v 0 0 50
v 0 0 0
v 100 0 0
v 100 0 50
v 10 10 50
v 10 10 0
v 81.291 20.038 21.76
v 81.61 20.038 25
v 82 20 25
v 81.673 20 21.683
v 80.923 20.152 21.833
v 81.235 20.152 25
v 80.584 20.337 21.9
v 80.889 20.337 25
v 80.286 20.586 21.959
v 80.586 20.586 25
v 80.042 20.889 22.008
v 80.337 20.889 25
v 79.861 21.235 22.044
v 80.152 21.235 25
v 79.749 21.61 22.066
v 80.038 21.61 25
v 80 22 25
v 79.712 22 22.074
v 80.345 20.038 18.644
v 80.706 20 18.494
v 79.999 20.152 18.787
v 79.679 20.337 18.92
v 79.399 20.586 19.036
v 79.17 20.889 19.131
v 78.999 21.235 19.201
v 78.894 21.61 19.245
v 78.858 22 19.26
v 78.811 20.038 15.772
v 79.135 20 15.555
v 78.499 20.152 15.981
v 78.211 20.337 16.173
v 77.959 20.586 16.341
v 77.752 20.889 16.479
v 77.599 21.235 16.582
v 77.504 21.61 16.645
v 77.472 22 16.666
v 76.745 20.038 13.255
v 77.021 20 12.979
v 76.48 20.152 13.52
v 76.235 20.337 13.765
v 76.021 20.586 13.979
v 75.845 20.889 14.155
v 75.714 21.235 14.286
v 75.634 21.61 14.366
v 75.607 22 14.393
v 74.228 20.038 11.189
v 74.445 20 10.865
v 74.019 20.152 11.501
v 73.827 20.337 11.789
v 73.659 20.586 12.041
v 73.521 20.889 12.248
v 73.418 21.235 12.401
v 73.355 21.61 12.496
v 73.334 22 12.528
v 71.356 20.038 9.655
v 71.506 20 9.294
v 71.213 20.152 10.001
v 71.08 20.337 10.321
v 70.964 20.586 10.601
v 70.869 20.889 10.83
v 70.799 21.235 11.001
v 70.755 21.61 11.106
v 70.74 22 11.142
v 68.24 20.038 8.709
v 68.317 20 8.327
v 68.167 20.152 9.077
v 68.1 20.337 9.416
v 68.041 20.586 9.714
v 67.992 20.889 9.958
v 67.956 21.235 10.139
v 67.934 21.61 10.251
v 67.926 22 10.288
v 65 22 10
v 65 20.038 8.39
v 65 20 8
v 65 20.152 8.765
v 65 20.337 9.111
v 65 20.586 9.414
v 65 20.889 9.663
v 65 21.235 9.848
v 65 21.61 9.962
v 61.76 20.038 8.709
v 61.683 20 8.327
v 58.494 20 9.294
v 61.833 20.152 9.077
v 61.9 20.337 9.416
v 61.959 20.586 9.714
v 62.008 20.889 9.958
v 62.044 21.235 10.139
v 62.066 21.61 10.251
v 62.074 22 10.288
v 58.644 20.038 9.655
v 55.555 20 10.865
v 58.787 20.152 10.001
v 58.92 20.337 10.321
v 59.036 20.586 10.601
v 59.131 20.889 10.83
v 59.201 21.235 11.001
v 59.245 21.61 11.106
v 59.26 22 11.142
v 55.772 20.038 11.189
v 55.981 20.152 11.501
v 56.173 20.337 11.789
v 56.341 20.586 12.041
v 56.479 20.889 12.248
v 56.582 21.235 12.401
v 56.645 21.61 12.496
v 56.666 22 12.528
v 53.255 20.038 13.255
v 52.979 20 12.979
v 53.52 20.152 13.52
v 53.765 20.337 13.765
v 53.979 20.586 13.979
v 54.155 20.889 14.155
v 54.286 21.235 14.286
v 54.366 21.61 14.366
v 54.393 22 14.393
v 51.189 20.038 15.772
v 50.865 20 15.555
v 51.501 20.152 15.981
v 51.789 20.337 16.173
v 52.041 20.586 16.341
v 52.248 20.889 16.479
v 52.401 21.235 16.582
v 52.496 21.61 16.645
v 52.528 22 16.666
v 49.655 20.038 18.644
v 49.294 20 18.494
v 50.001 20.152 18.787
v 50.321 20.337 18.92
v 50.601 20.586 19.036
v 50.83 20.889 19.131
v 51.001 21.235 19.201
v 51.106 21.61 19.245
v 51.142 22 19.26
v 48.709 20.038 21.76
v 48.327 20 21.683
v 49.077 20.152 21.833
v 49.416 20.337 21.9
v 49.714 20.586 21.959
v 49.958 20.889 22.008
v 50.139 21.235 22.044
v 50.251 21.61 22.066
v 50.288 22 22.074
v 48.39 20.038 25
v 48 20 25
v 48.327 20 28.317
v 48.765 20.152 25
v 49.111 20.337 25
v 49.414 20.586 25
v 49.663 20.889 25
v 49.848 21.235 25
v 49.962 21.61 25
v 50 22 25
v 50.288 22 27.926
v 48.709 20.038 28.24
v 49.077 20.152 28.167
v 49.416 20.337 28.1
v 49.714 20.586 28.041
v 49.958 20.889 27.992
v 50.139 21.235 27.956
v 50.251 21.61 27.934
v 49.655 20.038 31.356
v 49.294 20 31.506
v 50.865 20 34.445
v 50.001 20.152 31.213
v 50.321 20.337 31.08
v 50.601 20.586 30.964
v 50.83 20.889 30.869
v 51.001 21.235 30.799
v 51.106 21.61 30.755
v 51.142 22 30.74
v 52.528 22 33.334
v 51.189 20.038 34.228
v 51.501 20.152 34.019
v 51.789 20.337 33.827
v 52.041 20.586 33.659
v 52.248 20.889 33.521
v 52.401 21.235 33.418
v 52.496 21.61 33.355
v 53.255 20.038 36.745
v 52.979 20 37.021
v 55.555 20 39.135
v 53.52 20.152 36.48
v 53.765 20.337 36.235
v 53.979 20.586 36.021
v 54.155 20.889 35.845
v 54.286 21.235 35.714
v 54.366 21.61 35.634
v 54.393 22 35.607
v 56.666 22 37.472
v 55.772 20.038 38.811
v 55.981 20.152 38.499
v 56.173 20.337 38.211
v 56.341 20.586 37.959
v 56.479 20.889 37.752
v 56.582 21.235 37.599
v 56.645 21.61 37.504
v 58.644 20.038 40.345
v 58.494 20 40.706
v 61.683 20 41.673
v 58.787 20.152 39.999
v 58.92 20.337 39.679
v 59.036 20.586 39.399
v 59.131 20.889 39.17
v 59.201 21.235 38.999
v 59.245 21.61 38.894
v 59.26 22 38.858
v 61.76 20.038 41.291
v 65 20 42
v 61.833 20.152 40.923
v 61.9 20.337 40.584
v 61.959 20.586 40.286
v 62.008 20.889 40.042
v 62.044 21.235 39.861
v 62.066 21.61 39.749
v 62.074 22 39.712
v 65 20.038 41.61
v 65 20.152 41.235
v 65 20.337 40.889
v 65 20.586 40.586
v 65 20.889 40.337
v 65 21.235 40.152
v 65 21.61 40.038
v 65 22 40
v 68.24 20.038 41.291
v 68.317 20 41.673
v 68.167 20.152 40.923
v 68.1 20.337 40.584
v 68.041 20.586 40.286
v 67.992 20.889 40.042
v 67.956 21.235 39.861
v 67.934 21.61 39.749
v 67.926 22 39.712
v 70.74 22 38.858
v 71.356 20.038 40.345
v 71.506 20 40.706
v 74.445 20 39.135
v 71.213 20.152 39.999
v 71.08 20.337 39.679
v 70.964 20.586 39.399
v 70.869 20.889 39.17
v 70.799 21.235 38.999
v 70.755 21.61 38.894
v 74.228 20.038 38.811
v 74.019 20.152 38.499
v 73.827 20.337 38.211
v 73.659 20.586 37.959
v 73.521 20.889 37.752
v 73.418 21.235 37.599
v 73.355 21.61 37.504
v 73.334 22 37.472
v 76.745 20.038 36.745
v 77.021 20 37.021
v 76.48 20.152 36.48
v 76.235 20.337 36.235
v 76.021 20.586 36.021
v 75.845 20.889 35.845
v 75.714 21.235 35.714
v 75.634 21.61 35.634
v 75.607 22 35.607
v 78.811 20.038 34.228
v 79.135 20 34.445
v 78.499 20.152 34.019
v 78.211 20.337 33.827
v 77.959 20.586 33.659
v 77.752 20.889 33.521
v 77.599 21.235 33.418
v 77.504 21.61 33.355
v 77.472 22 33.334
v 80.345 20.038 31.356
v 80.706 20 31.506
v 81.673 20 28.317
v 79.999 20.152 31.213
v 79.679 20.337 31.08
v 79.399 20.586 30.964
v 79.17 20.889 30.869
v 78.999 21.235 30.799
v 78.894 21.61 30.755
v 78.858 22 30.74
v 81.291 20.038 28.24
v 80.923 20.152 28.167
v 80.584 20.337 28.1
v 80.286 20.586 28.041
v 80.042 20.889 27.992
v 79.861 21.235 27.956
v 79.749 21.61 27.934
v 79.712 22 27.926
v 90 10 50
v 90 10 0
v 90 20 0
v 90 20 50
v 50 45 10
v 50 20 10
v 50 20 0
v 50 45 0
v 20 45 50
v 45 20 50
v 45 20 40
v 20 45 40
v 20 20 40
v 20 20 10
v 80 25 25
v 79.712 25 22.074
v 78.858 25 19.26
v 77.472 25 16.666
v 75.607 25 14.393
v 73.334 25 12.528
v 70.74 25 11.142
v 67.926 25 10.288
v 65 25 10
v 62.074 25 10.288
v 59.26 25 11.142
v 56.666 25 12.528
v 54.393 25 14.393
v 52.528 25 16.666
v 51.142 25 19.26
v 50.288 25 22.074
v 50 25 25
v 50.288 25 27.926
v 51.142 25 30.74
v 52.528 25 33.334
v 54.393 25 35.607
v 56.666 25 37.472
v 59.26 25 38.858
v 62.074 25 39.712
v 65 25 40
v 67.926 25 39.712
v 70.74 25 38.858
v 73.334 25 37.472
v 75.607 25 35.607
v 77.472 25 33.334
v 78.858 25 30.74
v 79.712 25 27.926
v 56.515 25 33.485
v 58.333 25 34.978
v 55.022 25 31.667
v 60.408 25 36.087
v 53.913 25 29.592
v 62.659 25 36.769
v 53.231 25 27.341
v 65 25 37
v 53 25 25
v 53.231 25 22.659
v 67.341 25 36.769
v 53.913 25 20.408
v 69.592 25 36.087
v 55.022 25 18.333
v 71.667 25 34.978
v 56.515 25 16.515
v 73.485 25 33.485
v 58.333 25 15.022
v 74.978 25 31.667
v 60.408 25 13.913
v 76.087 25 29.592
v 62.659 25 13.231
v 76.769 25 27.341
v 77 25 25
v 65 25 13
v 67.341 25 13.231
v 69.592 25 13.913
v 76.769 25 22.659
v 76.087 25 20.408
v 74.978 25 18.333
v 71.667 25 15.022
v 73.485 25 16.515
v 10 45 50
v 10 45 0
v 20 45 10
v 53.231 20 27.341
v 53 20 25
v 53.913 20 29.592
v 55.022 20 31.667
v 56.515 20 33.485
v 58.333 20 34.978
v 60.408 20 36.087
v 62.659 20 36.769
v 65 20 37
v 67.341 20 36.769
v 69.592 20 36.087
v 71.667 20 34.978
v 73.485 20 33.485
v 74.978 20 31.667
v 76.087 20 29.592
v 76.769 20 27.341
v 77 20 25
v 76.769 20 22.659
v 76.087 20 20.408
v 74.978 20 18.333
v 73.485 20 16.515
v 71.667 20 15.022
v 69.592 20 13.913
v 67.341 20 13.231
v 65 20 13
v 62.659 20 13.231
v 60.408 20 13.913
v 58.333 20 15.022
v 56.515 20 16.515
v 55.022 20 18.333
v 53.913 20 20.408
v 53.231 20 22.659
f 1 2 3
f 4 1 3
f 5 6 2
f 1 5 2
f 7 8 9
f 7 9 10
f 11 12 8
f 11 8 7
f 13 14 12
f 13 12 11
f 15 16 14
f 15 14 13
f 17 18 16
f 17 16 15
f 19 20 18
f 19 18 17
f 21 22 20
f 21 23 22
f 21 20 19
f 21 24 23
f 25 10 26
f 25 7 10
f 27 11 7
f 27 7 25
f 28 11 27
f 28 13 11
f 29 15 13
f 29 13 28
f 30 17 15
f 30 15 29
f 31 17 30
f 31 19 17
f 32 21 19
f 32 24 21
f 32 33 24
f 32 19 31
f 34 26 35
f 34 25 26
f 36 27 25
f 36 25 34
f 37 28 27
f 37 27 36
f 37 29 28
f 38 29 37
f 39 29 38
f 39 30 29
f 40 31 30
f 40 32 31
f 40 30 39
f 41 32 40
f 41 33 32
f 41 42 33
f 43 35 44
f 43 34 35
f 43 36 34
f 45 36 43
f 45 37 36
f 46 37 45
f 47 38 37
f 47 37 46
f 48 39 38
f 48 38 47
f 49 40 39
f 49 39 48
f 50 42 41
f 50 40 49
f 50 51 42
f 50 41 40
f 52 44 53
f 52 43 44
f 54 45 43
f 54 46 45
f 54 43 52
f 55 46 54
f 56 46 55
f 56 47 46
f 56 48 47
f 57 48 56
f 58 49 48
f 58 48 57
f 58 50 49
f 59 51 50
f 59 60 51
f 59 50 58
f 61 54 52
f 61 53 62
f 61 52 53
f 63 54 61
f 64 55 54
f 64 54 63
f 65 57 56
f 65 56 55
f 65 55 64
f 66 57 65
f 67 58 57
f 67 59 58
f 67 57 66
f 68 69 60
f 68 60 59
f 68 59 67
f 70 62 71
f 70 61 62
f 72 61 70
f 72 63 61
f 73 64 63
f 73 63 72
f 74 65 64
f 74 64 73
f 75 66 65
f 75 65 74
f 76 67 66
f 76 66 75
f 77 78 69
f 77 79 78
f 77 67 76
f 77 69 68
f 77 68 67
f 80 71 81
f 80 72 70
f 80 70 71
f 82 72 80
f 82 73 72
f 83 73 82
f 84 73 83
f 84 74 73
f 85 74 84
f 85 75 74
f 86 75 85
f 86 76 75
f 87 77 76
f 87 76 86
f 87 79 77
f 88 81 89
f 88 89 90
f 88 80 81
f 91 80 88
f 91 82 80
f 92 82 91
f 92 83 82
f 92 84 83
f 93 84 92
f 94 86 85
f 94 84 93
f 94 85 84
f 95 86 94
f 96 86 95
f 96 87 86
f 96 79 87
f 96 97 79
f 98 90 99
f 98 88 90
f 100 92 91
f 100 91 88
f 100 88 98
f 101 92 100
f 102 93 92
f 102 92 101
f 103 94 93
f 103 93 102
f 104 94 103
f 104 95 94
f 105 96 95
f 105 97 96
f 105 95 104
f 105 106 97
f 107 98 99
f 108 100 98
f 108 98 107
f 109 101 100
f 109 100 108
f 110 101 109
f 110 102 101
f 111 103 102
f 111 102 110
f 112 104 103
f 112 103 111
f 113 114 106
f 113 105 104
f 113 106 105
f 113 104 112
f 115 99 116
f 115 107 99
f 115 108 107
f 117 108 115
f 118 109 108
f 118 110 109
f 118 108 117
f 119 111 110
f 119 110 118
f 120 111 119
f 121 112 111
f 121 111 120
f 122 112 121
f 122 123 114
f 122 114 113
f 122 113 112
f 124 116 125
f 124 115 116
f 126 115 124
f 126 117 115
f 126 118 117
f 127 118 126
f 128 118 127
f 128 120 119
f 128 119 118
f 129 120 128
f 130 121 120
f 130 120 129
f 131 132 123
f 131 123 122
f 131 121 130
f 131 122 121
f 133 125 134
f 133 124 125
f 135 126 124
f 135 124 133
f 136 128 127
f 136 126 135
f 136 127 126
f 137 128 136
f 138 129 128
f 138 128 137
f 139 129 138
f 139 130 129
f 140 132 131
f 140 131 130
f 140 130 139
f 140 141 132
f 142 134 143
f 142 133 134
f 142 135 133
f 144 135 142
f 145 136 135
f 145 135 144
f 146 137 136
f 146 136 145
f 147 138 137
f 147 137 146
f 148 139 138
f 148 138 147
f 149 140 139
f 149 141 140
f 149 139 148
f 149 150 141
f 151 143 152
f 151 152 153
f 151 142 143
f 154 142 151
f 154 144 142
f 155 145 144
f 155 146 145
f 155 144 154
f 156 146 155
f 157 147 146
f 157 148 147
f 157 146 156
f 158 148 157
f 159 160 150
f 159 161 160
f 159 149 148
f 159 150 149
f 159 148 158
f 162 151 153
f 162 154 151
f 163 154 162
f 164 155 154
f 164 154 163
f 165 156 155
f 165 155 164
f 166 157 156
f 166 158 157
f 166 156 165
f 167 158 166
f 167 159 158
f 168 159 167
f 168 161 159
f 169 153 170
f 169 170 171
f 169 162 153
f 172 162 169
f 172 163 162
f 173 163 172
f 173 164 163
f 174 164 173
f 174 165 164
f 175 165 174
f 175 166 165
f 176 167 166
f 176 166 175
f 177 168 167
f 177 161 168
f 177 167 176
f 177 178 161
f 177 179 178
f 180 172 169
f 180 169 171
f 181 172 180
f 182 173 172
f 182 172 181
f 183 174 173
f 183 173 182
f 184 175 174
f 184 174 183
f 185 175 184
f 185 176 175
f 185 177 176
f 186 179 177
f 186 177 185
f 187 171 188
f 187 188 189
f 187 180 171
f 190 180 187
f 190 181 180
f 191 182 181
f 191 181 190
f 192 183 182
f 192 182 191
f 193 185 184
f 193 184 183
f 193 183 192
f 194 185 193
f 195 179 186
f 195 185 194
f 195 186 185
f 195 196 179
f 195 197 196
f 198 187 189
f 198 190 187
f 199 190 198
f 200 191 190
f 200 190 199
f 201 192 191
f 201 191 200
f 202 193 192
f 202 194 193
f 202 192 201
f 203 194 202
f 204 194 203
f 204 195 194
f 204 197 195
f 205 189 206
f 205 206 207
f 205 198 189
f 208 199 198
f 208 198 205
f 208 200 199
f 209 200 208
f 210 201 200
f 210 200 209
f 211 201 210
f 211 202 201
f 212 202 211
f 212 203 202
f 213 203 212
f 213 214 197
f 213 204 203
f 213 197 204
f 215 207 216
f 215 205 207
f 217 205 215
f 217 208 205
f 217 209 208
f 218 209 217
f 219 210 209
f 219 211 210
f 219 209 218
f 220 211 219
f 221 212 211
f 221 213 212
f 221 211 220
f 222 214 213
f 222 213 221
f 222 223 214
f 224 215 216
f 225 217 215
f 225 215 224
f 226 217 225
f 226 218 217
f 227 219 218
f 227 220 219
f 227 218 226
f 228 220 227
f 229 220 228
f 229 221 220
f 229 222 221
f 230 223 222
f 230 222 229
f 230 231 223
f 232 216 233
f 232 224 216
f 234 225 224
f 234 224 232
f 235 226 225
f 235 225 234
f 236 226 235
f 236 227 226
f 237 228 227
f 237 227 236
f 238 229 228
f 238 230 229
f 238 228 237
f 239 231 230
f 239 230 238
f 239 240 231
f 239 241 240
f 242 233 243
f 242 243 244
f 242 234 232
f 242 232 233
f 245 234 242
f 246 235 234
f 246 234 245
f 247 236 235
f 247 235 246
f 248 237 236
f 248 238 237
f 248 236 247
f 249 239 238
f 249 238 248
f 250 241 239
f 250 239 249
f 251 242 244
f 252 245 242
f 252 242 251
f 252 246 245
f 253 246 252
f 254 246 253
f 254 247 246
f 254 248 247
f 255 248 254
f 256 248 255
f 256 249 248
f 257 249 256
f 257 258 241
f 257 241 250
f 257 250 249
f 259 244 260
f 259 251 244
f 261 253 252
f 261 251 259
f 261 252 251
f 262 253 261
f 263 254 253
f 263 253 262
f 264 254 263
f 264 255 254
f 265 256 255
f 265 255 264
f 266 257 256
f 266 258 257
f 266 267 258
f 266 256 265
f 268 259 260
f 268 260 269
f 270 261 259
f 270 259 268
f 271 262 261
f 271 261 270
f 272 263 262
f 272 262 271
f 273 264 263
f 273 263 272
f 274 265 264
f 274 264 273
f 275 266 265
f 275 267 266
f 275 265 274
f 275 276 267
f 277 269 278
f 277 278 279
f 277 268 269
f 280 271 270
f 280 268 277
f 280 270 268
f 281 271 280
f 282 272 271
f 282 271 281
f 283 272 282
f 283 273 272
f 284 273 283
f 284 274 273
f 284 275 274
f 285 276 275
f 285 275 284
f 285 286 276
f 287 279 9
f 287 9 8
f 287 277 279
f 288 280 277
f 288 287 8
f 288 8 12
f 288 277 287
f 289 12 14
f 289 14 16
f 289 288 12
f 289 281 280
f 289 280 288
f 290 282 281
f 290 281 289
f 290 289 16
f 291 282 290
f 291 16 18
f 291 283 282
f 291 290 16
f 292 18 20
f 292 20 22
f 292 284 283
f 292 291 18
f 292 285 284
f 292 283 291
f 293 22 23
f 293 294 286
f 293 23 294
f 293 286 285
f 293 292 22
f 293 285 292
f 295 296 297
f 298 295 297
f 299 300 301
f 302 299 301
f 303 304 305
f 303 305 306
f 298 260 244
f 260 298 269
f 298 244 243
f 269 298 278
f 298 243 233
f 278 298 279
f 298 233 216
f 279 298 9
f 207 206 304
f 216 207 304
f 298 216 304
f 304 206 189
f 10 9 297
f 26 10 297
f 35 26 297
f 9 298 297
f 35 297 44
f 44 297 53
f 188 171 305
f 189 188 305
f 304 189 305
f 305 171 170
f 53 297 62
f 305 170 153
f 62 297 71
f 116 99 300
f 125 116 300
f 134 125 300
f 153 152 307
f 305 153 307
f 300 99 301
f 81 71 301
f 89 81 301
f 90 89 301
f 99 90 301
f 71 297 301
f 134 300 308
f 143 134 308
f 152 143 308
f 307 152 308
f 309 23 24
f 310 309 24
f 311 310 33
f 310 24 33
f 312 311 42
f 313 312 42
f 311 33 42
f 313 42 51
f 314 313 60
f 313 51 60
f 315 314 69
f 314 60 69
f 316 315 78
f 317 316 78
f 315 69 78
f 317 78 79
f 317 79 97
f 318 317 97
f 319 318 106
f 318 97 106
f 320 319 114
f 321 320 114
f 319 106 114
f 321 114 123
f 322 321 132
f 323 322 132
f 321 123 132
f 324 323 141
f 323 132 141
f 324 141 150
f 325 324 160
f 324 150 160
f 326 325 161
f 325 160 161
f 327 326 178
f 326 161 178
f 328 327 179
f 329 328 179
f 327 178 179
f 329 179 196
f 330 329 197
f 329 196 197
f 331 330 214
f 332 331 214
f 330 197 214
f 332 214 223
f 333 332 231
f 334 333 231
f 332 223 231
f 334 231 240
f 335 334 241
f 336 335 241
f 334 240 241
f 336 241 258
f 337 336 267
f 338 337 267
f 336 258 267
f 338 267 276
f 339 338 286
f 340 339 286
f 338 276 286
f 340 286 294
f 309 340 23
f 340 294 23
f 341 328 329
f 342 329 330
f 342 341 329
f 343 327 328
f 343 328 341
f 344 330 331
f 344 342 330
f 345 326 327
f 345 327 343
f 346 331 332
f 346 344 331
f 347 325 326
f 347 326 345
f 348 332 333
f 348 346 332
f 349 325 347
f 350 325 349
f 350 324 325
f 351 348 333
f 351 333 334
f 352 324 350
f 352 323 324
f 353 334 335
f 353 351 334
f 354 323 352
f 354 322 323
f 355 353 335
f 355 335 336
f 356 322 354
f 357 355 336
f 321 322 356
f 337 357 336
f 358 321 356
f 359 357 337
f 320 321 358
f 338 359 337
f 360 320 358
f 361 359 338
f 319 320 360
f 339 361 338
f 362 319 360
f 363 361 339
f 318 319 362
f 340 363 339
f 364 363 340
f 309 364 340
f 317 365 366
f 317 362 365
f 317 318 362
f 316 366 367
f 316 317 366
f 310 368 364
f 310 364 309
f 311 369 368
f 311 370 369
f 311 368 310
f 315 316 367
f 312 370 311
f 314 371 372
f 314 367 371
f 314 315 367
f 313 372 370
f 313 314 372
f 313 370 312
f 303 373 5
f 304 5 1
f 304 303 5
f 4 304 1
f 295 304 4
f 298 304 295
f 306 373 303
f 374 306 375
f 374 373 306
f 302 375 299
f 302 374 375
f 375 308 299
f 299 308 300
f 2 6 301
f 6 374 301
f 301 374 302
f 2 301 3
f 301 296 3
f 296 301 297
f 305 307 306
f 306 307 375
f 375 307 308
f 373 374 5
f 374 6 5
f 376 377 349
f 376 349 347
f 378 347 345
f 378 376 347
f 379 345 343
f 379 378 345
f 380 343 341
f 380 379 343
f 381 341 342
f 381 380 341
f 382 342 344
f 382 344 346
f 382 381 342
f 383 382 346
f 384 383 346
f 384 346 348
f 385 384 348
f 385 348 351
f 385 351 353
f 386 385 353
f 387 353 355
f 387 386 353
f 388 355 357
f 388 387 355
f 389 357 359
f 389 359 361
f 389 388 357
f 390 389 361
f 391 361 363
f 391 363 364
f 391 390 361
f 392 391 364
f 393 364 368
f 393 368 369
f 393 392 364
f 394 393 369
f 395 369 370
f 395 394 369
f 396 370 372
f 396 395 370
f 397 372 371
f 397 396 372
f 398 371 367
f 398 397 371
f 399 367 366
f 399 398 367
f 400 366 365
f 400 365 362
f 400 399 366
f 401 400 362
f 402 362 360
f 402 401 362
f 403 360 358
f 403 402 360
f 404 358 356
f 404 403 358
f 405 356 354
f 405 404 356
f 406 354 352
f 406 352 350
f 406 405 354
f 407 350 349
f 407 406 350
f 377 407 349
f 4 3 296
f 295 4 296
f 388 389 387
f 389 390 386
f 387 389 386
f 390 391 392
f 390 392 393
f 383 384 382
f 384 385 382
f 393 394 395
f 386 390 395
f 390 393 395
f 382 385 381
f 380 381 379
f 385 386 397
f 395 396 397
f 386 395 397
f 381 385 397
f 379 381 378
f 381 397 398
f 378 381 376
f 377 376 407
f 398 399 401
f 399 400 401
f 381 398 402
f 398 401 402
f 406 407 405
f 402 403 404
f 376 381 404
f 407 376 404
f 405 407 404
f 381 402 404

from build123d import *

# Parameters (mm, degrees)
BOSS_EXTRUDE1_DEPTH = 50
BOSS_EXTRUDE2_START = 50
BOSS_EXTRUDE2_DEPTH = 10
SKETCH2_R           = 15
SKETCH2_R_2         = 12
BOSS_EXTRUDE3_DEPTH = 5
BOSS_EXTRUDE4_DEPTH = 25
FILLET1_R           = 2


with BuildPart() as part:
    # Sketch1 → Boss-Extrude1 (new body)
    with BuildSketch(Plane.XY):
        Polygon((10, 10), (0, 0), (100, 0), (90, 10), (90, 20), (45, 20), (10, 20), align=None)
    extrude(amount=BOSS_EXTRUDE1_DEPTH)

    # Sketch1<4> → Boss-Extrude2 (add)
    with BuildSketch(Plane.XY.offset(BOSS_EXTRUDE2_START)):
        Polygon((10, 45), (10, 20), (45, 20), (20, 45), align=None)
    extrude(amount=-BOSS_EXTRUDE2_DEPTH)

    # Sketch2 → Boss-Extrude3 (add)
    with BuildSketch(Plane(origin=(0, 20, 0), x_dir=(1, 0, 0), z_dir=(0, 1, 0))):
        with Locations((65, -25)):
            Circle(SKETCH2_R)
        with Locations(Location((65, -25, 0), (0, 0, 180))):
            Circle(SKETCH2_R_2, mode=Mode.SUBTRACT)
    extrude(amount=BOSS_EXTRUDE3_DEPTH)

    # Sketch2<3> → Boss-Extrude4 (add)
    with BuildSketch(Plane(origin=(0, 20, 0), x_dir=(1, 0, 0), z_dir=(0, 1, 0))):
        Polygon((10, -40), (20, -40), (20, -10), (50, -10), (50, 0), (10, 0), align=None)
    extrude(amount=BOSS_EXTRUDE4_DEPTH)

    # Fillet1
    fillet1_edges = [part.edges().sort_by_distance(p)[0] for p in [
        (50, 20, 25),
    ]]
    fillet(fillet1_edges, radius=FILLET1_R)


solid = part.part
